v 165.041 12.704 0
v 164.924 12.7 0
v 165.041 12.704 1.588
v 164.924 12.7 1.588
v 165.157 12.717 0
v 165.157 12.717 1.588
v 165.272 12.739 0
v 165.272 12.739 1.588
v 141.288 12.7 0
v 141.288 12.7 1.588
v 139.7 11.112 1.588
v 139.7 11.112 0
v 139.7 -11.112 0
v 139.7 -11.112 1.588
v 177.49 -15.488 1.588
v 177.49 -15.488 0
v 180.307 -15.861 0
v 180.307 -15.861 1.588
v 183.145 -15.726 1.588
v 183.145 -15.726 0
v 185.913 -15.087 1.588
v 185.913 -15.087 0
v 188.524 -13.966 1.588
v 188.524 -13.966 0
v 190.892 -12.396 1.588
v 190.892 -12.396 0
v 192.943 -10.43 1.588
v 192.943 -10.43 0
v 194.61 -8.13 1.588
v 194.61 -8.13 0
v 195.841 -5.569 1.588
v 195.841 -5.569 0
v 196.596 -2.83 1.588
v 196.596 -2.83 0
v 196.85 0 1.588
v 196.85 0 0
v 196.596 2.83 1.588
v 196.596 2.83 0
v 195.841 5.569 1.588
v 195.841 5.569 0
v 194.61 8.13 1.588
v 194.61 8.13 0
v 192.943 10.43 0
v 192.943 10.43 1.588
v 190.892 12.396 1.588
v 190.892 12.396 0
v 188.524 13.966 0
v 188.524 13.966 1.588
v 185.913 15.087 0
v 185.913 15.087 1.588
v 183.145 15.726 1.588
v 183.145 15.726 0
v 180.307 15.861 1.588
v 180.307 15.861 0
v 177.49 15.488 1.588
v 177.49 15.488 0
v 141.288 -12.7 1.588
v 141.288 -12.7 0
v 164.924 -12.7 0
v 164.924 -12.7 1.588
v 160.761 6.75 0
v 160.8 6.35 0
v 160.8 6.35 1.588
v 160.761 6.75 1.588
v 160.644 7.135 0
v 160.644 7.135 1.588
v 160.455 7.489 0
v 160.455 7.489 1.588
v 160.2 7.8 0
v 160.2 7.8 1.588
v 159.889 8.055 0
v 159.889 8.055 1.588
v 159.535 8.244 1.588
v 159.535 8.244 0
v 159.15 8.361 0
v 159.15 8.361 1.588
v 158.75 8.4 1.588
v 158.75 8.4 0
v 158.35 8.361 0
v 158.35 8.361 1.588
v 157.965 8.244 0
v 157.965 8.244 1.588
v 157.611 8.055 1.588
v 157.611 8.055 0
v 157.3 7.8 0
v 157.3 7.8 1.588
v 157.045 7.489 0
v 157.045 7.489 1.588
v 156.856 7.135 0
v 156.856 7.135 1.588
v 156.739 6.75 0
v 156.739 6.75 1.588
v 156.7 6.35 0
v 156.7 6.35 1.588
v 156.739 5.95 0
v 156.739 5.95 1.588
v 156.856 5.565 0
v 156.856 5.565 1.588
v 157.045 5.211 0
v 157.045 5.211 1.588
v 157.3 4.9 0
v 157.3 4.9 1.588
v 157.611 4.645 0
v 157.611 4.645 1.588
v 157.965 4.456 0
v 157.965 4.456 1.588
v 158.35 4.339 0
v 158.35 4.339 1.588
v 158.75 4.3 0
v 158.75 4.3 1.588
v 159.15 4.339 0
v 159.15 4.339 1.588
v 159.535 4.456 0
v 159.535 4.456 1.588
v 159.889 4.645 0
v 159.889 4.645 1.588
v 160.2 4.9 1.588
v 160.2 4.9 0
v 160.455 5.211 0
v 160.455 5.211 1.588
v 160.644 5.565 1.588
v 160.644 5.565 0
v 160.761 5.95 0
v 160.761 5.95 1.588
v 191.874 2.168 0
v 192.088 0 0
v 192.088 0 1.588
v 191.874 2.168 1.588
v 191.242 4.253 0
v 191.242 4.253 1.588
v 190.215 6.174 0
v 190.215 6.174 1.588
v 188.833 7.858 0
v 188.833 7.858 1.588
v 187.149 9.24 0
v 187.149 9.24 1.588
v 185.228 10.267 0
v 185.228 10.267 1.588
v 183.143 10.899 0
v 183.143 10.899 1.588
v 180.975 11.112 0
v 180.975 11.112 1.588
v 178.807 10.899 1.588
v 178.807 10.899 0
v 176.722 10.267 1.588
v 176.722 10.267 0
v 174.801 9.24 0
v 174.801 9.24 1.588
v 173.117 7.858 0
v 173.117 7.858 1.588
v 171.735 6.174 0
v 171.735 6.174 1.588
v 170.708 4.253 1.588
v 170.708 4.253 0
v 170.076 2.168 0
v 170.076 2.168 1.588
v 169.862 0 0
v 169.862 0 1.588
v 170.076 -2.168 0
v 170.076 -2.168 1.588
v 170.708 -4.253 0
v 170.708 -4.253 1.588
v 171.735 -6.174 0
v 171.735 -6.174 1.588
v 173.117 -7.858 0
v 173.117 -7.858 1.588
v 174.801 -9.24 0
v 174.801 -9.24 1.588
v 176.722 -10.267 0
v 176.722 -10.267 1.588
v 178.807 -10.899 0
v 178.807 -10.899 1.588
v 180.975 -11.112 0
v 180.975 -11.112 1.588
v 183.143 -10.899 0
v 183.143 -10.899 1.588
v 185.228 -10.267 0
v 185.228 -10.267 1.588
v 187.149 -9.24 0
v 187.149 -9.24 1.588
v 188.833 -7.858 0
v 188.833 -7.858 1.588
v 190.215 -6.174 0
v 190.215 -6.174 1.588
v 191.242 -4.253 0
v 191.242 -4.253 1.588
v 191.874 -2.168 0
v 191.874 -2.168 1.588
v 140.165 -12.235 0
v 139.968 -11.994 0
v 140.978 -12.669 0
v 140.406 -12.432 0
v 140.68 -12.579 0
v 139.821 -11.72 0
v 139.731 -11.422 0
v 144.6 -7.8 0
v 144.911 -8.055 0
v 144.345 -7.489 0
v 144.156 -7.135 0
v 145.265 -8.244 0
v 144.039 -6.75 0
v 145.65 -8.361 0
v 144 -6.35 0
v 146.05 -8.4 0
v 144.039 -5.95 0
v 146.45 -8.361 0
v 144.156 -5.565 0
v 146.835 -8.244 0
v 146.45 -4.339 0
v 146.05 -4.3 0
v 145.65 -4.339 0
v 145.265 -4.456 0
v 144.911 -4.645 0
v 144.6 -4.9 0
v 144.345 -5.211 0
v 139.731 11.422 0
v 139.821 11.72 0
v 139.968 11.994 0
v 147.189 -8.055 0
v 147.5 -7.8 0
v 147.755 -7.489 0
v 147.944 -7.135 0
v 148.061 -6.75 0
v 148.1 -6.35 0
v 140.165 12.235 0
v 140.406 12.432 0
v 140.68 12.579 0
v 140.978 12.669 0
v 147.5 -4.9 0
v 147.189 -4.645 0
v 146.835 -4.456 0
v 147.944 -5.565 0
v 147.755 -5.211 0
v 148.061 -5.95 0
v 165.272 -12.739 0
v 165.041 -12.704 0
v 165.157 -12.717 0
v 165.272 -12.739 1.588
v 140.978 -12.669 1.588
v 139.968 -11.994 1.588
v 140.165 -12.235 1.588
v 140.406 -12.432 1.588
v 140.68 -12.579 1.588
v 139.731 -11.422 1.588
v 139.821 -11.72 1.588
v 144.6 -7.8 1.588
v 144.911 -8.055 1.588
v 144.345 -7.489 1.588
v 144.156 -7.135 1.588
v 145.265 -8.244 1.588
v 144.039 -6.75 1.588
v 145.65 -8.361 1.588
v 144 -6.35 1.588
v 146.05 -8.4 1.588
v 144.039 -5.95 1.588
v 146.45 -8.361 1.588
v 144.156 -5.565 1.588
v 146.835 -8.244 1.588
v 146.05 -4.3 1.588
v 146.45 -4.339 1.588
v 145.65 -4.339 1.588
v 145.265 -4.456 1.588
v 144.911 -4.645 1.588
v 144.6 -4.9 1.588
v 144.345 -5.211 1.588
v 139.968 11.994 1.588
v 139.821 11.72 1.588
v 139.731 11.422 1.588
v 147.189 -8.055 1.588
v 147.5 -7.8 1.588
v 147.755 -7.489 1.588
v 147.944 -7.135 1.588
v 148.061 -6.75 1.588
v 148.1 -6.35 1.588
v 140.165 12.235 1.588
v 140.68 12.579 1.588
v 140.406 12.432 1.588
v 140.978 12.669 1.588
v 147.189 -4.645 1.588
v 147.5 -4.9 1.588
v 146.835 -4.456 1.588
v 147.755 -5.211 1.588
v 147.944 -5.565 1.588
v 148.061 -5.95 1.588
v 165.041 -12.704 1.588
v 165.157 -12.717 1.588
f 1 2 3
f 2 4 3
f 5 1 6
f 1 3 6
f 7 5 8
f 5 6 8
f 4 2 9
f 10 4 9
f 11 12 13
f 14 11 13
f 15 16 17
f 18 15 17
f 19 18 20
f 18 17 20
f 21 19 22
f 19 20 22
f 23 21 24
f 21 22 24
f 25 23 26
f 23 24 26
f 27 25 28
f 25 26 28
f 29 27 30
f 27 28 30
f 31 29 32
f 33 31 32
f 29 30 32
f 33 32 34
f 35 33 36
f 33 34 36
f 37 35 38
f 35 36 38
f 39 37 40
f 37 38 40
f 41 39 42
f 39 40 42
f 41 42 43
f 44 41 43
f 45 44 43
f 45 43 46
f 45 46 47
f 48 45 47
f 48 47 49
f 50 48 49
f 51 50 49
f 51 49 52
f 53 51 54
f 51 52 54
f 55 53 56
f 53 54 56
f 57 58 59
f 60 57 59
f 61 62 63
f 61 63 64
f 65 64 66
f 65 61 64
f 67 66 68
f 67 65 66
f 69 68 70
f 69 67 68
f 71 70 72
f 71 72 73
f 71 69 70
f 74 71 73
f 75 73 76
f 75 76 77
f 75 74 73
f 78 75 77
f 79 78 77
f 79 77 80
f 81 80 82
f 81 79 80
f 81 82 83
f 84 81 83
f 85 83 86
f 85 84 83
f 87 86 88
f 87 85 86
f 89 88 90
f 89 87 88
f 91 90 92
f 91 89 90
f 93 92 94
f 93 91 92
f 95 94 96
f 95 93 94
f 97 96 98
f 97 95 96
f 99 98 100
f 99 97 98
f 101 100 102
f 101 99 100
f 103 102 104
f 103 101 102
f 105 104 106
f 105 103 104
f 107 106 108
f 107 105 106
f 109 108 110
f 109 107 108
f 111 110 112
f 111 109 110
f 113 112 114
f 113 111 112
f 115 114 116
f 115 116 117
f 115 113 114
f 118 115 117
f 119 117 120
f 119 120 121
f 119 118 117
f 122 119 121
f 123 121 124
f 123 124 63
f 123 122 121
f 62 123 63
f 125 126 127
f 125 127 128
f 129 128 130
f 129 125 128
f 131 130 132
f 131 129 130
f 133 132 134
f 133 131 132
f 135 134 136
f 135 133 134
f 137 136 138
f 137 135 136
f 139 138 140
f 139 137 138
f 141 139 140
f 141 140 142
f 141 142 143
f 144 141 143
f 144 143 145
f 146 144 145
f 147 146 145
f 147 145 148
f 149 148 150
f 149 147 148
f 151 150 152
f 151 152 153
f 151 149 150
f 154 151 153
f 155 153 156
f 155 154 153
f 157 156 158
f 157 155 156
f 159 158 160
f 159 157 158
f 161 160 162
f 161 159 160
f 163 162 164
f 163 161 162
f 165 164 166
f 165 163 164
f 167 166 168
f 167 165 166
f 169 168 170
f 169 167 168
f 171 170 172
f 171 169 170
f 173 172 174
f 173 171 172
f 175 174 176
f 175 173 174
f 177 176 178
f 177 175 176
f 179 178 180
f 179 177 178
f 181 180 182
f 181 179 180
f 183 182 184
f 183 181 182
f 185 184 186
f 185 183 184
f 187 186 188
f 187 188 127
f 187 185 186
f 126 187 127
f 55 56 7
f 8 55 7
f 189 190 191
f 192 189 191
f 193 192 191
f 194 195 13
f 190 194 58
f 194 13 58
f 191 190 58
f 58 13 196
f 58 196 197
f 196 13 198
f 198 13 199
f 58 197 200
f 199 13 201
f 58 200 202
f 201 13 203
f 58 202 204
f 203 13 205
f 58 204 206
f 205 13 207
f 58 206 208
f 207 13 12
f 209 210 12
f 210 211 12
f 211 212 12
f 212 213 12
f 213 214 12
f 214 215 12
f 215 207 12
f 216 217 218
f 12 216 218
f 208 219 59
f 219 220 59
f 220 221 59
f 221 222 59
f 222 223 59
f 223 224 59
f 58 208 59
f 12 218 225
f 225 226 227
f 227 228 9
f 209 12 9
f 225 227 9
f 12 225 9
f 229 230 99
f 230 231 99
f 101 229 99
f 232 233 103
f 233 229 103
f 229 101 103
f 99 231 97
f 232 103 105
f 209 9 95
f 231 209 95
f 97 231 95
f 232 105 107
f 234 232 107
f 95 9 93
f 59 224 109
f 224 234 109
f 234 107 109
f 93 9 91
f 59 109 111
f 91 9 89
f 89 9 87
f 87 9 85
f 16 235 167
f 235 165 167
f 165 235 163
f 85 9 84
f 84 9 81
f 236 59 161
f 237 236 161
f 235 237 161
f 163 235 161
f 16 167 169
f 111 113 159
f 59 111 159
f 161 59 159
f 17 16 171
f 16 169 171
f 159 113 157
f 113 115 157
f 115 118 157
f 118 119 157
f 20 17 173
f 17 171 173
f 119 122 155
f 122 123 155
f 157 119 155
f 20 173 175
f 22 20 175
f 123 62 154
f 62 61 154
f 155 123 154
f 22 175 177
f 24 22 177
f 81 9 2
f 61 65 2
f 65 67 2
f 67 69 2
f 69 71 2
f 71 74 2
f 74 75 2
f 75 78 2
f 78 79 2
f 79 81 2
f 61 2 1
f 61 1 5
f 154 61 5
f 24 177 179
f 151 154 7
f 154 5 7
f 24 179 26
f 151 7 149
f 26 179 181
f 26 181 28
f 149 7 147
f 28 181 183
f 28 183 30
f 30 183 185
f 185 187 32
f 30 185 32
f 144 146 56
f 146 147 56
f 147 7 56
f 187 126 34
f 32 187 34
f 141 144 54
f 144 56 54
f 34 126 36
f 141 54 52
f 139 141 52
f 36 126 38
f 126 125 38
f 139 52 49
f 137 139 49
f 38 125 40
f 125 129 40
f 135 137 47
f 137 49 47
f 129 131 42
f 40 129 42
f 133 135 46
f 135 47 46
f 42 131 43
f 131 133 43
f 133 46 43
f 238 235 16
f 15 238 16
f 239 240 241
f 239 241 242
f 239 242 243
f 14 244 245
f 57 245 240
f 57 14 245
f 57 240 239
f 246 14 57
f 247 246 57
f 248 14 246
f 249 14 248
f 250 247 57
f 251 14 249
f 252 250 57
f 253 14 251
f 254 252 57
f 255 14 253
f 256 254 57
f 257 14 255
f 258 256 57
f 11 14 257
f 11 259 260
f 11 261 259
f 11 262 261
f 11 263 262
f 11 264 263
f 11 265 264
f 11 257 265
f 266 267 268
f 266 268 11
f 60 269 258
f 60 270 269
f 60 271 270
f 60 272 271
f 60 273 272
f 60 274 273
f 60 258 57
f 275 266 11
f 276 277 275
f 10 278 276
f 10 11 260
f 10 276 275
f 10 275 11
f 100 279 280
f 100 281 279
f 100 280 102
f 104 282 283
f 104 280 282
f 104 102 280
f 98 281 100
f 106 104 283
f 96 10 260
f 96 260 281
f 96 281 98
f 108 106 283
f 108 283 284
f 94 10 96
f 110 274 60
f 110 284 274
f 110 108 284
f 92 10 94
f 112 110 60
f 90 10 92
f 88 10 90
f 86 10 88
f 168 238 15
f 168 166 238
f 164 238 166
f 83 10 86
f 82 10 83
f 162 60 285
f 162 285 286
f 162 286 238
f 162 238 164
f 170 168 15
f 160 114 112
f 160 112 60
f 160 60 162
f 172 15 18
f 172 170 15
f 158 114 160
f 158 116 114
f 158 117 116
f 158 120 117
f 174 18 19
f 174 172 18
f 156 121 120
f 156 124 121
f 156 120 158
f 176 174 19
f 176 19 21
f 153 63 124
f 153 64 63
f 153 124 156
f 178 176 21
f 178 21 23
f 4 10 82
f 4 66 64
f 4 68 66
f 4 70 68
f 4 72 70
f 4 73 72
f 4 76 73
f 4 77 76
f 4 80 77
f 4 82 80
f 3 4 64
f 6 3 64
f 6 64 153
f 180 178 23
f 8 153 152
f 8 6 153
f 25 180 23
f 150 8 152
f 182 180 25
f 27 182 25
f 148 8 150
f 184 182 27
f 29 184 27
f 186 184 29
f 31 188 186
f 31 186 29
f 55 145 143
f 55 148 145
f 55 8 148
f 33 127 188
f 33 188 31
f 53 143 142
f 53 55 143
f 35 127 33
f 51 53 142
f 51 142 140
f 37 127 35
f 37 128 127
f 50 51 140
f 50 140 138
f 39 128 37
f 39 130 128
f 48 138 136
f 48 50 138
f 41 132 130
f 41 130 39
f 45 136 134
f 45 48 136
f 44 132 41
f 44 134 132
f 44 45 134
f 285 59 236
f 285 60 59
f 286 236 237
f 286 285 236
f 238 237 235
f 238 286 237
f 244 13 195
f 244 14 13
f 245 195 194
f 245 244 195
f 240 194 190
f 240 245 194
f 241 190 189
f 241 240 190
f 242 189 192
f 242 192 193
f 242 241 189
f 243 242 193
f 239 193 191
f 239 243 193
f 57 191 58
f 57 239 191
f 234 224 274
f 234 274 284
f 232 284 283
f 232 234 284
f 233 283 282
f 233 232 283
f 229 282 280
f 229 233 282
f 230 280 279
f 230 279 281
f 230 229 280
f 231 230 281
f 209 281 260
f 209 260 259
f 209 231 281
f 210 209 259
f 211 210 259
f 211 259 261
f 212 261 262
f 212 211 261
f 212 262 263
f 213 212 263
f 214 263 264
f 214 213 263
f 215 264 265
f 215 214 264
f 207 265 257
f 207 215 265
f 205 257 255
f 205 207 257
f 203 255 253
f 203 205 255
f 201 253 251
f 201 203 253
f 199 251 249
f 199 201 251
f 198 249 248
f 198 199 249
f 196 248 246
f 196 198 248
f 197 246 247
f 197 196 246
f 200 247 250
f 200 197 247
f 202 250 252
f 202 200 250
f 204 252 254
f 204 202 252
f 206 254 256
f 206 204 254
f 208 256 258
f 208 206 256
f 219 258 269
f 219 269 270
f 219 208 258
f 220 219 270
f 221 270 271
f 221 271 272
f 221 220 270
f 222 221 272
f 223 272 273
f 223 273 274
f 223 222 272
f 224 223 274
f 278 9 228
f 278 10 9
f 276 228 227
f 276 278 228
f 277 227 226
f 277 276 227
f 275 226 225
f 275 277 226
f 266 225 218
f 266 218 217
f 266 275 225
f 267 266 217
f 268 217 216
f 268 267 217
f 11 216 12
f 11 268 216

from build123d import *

# Parameters (mm, degrees)
SKETCH1_R           = 2.05
SKETCH1_R_2         = 15.875
SKETCH1_R_3         = 11.1125
BOSS_EXTRUDE1_DEPTH = 1.5875
FILLET1_R           = 1.5875


with BuildPart() as part:
    # Sketch1 → Boss-Extrude1 (new body)
    with BuildSketch(Plane.XY):
        Polygon((165.1, 12.7), (139.7, 12.7), (139.7, -12.7), (165.1, -12.7), (165.1, 3.4e-08), align=None)
        with Locations((146.05, -6.35)):
            Circle(SKETCH1_R, mode=Mode.SUBTRACT)
        with Locations((158.75, 6.35)):
            Circle(SKETCH1_R, mode=Mode.SUBTRACT)
        with BuildLine():
            Line((177.490243902, 15.487804878), (165.1, 12.7))
            Line((165.1, 12.7), (165.1, 3.4e-08))
            ThreePointArc((165.1, 3.4e-08), (168.578707661, 9.917033893), (177.490243902, 15.487804878))
        make_face()
        with Locations((180.975, 0)):
            Circle(SKETCH1_R_2)
        with Locations((180.975, 0)):
            Circle(SKETCH1_R_3, mode=Mode.SUBTRACT)
        with BuildLine():
            ThreePointArc((177.490243902, -15.487804878), (168.57870764, -9.917033867), (165.1, 3.4e-08))
            Line((165.1, 3.4e-08), (165.1, -12.7))
            Line((165.1, -12.7), (177.490243902, -15.487804878))
        make_face()
    extrude(amount=BOSS_EXTRUDE1_DEPTH)

    # Fillet1
    fillet1_edges = [part.edges().sort_by_distance(p)[0] for p in [
        (165.1, 12.7, 0.79375),
        (165.1, -12.7, 0.79375),
        (139.7, -12.7, 0.79375),
        (139.7, 12.7, 0.79375),
    ]]
    fillet(fillet1_edges, radius=FILLET1_R)


solid = part.part
